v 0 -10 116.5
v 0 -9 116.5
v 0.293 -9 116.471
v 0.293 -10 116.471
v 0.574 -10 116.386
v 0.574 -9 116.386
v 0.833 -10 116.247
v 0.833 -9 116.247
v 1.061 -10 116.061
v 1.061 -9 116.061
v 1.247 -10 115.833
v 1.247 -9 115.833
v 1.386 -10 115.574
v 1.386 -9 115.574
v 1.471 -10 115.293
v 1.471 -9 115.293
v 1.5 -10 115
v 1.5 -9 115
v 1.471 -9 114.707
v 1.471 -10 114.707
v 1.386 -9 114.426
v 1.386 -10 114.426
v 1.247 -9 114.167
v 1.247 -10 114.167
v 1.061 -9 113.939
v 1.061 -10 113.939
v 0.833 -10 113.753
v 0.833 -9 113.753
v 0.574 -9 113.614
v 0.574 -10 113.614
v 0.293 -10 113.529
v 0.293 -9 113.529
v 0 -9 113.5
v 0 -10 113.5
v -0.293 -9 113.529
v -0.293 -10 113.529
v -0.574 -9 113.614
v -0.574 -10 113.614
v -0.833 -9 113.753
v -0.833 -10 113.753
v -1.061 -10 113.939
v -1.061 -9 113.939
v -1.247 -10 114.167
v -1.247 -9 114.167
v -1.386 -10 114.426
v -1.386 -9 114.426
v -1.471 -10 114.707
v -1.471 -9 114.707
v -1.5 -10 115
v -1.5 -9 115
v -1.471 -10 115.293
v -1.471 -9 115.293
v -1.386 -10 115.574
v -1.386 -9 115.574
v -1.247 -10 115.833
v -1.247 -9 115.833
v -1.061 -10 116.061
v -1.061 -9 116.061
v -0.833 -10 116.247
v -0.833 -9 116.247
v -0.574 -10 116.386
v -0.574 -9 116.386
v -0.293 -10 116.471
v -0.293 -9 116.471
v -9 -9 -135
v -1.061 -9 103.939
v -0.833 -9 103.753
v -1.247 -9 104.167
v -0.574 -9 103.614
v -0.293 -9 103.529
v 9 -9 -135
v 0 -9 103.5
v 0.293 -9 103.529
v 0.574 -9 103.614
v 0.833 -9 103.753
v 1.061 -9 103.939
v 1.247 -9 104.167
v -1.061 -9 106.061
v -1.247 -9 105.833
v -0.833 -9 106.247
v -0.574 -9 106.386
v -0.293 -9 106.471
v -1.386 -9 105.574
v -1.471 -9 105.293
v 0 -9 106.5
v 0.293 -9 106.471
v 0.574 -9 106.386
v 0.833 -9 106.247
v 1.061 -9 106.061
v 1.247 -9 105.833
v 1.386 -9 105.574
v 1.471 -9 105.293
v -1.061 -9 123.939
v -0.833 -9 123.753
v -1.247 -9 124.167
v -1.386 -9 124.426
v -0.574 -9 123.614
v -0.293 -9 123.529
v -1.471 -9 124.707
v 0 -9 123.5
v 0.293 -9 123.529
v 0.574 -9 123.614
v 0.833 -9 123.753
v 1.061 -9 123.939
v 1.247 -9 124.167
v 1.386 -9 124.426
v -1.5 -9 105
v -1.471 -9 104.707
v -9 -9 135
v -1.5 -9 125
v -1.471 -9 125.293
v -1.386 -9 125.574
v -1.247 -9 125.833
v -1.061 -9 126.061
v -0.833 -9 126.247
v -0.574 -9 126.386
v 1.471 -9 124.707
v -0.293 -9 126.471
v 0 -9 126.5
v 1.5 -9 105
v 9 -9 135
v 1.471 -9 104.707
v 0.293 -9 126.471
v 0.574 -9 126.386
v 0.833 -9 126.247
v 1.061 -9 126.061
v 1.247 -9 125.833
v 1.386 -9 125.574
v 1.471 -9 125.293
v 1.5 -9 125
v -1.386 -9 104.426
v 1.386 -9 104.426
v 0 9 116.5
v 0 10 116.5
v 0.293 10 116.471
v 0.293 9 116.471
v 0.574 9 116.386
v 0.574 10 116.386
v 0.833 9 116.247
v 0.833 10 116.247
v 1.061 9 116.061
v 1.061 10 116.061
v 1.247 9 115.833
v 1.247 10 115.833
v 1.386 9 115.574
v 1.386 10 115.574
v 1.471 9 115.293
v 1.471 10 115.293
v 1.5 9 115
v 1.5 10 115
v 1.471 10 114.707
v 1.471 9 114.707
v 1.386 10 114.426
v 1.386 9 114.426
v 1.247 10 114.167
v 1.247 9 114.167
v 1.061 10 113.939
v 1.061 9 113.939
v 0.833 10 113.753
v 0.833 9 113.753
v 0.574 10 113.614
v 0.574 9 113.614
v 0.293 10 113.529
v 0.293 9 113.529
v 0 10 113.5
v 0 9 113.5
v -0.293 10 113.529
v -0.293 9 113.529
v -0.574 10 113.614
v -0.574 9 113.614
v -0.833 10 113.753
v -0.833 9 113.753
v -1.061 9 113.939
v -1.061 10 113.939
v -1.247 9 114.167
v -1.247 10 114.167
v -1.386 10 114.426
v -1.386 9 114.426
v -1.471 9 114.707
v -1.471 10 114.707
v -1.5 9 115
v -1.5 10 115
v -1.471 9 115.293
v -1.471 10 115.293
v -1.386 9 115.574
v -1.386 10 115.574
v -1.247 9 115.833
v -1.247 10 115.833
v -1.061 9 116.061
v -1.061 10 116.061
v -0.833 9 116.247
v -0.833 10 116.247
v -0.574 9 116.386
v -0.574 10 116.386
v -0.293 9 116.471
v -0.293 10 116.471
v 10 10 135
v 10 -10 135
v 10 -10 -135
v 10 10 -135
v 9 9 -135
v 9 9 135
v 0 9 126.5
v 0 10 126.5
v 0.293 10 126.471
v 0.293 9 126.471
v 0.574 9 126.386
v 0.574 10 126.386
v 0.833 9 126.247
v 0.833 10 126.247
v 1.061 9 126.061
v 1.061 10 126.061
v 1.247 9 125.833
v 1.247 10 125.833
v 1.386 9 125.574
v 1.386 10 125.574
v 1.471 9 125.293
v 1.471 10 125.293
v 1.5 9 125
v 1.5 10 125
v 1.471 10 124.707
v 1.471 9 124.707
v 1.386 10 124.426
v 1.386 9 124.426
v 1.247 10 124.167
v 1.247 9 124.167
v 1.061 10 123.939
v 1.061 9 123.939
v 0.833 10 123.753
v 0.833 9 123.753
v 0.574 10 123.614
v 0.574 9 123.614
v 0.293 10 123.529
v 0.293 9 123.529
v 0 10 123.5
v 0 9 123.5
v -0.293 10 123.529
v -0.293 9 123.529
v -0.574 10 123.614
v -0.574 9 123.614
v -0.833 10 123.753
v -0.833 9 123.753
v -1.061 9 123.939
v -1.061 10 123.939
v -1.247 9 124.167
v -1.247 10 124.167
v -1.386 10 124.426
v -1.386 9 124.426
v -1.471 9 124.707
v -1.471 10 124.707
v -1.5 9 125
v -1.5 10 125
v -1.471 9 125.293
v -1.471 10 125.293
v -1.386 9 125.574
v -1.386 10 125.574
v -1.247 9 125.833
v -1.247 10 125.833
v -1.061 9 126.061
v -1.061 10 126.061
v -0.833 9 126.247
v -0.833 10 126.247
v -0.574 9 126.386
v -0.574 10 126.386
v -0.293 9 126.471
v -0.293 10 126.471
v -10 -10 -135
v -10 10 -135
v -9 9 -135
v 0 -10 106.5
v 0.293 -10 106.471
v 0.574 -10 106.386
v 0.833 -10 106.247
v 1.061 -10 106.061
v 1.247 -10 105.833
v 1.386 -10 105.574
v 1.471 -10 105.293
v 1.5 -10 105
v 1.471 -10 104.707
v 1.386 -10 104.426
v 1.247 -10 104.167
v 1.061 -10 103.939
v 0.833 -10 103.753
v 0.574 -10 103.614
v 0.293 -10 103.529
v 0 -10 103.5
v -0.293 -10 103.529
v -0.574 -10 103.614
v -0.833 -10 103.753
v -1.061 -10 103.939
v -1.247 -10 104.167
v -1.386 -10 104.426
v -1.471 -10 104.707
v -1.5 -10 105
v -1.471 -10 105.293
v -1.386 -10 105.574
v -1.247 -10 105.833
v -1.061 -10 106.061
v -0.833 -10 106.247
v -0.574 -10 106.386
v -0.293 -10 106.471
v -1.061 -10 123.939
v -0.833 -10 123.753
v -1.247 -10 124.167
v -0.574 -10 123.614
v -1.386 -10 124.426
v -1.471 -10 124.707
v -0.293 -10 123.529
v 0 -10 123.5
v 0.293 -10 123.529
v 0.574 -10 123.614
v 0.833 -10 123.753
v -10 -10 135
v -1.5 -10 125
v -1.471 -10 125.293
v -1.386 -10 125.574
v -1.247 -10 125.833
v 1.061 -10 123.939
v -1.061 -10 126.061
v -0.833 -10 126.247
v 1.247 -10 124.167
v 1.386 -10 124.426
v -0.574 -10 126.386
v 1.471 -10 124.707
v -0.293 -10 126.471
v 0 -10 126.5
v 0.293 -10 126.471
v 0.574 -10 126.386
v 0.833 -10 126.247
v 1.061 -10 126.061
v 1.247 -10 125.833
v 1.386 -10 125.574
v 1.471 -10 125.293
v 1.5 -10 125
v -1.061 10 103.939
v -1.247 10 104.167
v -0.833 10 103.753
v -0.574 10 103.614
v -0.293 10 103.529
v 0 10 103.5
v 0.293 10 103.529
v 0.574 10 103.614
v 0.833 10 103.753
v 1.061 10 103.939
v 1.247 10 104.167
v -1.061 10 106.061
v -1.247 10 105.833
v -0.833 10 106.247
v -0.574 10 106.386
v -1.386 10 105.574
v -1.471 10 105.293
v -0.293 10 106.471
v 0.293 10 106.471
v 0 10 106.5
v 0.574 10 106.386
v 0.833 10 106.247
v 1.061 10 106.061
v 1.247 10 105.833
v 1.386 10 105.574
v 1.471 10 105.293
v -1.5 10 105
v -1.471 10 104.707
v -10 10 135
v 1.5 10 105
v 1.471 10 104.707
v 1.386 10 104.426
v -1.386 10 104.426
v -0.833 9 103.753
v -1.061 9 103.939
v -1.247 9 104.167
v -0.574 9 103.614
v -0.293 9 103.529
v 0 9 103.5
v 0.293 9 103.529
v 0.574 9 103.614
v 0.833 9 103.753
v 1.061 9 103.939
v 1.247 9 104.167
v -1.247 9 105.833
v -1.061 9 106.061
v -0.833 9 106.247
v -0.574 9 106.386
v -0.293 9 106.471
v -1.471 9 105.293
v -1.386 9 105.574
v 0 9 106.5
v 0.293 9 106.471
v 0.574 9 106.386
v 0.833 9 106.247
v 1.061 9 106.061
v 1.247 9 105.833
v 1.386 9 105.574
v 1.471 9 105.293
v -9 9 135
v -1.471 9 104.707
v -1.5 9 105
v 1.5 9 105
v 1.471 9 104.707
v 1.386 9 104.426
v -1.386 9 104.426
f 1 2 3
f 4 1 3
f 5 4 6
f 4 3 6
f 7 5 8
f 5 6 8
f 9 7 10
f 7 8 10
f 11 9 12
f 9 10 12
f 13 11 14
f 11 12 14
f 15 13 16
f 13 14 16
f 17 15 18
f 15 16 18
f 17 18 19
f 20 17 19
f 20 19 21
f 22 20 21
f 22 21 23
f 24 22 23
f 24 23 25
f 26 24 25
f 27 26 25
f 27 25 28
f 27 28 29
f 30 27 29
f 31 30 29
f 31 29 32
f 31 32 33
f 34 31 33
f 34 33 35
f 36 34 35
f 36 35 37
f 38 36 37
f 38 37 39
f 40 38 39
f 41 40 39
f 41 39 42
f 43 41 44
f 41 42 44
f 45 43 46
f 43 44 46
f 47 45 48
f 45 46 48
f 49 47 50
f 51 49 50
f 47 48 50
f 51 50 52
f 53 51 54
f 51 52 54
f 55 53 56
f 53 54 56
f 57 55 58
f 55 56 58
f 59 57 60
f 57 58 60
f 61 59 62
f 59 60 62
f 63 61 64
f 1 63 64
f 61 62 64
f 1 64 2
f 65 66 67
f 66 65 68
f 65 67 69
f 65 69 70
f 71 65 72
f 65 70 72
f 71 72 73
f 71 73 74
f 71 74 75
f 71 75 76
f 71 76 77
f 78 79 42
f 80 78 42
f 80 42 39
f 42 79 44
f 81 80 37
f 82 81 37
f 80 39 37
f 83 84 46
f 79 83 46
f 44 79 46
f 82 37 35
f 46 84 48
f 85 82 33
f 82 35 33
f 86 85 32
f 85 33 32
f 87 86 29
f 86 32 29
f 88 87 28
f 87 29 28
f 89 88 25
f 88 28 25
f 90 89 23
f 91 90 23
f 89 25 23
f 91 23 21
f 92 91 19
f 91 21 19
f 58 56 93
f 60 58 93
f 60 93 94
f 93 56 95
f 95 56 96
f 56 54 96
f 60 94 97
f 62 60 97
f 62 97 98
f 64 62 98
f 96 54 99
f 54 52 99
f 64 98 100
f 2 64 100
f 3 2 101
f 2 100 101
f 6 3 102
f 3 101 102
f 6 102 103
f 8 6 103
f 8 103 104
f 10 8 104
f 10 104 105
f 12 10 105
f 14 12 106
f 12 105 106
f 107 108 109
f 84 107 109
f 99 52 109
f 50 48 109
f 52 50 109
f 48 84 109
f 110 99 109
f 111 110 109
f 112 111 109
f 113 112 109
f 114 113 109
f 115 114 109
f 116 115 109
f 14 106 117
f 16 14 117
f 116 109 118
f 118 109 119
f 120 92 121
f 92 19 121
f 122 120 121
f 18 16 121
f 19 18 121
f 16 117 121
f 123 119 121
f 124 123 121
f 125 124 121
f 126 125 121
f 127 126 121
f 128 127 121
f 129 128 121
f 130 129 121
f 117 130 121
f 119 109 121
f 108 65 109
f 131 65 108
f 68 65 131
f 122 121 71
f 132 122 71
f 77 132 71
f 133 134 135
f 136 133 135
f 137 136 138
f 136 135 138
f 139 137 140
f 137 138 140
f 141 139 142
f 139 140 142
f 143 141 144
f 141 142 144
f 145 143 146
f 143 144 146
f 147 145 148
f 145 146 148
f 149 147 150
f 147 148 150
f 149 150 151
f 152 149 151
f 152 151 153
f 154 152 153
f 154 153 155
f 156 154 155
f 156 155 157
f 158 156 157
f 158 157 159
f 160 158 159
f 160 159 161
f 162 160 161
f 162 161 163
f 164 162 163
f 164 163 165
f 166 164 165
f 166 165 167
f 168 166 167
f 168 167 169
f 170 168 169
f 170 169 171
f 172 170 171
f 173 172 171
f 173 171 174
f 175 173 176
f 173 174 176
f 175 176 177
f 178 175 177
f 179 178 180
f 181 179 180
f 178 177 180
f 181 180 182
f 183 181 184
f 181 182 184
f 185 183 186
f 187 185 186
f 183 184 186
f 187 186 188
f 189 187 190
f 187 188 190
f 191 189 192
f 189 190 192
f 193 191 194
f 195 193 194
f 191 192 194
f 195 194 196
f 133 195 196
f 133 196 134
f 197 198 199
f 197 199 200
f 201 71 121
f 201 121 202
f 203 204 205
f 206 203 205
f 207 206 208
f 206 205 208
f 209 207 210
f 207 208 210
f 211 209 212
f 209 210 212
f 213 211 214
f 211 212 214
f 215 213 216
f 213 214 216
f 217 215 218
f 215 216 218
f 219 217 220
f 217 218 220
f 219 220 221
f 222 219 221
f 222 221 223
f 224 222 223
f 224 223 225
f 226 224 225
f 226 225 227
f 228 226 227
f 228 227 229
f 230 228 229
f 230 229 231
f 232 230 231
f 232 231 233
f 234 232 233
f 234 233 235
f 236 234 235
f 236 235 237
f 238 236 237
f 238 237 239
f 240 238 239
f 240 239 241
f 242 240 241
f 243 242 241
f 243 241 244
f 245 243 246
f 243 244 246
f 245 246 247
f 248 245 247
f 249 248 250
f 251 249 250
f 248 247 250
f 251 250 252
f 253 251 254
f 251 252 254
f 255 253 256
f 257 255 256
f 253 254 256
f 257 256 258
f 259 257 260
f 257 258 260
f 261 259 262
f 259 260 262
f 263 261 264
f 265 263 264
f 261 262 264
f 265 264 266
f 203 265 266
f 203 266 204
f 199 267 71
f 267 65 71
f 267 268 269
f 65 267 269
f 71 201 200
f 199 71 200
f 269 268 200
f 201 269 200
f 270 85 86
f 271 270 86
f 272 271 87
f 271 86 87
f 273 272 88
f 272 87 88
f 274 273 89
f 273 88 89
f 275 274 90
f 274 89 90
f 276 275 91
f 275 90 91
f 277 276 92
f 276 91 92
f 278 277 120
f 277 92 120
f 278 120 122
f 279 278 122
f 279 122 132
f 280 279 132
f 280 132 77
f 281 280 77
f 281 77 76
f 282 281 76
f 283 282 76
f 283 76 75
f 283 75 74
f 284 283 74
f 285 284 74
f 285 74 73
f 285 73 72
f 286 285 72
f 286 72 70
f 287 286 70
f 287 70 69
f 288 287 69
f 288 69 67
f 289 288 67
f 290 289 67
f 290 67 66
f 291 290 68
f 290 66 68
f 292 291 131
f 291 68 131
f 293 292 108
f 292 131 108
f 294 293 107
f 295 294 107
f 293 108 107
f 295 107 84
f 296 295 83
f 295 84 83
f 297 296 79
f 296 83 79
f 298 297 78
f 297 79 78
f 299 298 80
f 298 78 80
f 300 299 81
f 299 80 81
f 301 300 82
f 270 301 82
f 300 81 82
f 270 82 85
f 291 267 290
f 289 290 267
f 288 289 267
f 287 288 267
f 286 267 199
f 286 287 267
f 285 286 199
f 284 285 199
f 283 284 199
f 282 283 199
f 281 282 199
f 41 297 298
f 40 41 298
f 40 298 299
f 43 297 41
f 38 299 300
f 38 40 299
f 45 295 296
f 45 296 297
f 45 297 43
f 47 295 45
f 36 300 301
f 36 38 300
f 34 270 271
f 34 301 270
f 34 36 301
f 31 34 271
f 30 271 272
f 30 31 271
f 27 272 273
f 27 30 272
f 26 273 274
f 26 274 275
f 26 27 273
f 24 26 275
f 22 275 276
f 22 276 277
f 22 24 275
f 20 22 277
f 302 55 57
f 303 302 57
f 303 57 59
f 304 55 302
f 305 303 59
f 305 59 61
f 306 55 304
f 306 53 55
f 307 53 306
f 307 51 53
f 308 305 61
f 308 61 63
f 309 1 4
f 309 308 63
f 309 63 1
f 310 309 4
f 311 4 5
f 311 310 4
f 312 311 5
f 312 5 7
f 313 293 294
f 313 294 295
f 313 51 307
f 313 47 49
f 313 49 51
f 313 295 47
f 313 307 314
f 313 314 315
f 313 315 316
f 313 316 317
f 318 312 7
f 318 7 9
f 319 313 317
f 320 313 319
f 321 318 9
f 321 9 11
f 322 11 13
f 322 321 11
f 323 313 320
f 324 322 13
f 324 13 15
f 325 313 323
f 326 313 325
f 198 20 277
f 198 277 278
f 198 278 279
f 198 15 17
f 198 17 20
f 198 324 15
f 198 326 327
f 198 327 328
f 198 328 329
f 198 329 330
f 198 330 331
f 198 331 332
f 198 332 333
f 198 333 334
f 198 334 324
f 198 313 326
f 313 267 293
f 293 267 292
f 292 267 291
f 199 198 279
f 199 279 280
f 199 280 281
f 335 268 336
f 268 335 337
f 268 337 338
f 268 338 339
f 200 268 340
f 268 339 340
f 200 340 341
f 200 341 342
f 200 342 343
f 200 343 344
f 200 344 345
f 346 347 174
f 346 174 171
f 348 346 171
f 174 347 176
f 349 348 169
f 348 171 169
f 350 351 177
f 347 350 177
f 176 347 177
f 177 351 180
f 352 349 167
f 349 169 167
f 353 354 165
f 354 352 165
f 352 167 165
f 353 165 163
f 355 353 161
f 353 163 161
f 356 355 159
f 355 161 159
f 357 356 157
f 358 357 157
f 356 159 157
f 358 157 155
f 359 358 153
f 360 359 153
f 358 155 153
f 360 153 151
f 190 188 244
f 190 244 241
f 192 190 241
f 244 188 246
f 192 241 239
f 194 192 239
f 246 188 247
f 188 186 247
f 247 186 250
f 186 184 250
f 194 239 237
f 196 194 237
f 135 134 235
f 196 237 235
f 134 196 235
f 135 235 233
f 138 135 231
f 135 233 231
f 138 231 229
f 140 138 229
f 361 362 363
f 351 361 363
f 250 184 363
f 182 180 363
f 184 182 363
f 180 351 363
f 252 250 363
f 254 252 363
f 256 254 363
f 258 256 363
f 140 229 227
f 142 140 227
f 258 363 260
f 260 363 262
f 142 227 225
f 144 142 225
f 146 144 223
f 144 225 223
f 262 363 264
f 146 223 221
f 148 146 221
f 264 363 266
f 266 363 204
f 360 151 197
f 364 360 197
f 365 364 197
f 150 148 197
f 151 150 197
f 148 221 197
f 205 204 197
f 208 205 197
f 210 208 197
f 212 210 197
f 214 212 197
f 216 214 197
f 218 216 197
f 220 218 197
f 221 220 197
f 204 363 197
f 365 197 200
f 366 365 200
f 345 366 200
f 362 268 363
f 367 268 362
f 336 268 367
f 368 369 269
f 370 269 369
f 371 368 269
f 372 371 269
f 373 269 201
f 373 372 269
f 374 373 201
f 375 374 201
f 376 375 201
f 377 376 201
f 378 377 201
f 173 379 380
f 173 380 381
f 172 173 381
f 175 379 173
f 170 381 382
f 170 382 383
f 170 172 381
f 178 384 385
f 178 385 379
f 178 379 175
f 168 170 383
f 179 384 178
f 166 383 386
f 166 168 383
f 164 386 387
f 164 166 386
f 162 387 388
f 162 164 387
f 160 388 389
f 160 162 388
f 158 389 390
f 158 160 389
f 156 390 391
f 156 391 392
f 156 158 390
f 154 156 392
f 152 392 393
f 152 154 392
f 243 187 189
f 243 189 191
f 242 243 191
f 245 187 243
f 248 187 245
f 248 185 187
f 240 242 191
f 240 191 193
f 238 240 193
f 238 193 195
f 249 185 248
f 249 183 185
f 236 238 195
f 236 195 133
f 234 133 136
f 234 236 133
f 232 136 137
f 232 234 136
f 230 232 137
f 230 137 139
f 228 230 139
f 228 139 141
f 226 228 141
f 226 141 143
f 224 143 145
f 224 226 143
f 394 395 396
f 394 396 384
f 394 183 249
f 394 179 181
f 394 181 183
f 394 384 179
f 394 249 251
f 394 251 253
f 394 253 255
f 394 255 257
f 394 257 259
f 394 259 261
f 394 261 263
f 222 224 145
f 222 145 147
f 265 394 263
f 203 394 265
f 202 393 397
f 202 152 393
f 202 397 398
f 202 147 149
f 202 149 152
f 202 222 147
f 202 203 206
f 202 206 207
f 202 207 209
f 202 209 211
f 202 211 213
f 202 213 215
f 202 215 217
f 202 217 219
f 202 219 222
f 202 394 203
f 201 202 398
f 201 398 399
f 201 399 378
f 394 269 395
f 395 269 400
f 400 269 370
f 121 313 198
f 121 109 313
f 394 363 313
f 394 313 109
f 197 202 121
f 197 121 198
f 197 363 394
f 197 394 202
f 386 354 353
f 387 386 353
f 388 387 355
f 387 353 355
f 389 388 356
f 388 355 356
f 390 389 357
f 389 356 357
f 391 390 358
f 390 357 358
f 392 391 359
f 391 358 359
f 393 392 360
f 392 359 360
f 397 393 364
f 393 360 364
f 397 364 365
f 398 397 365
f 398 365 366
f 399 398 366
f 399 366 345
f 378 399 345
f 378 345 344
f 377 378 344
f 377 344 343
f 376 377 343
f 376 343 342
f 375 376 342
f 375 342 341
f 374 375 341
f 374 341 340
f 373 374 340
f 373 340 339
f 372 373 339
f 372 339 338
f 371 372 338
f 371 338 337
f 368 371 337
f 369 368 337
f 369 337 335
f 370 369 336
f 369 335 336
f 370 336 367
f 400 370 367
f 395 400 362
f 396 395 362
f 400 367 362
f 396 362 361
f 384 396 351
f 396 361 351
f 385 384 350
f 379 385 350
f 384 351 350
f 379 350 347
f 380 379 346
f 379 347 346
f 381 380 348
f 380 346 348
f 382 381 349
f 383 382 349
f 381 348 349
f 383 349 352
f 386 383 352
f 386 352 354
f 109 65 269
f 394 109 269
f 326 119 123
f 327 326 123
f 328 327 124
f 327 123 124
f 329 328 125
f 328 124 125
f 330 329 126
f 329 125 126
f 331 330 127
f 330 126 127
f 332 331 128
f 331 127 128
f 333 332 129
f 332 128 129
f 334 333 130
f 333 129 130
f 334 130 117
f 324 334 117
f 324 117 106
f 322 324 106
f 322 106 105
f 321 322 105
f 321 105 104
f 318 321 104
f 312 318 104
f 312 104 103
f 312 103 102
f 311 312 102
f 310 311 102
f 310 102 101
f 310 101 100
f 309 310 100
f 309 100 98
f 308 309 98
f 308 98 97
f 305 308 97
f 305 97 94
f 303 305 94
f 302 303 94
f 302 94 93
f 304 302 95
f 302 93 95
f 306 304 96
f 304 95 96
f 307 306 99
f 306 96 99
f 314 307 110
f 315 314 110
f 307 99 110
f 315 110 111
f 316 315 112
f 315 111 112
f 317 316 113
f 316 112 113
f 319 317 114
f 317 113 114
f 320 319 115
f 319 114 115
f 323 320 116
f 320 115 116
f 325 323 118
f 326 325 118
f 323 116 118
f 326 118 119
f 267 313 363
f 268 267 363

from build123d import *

# Parameters (mm, degrees)
SKETCH_1_W          = 20
SKETCH_1_H          = 20
SKETCH_1_W_2        = 18
SKETCH_1_H_2        = 18
EXTRUDE_1_DEPTH     = 135
SKETCH_2_R          = 1.5
CUT_EXTRUDE_1_DEPTH = 100


with BuildPart() as part:
    # 草图1 → 凸台-拉伸1 (new, symmetric)
    with BuildSketch(Plane.XY):
        Rectangle(SKETCH_1_W, SKETCH_1_H)
        Rectangle(SKETCH_1_W_2, SKETCH_1_H_2, mode=Mode.SUBTRACT)
    extrude(amount=EXTRUDE_1_DEPTH, both=True)

    # 草图2 → 切除-拉伸1 (cut)
    with BuildSketch(Plane(origin=(0, 10, 0), x_dir=(1, 0, 0), z_dir=(0, 1, 0))):
        with Locations(Location((0, -125, 0), (0, 0, 270))):
            Circle(SKETCH_2_R)
        with Locations(Location((0, -115, 0), (0, 0, 270))):
            Circle(SKETCH_2_R)
        with Locations(Location((0, -105, 0), (0, 0, 270))):
            Circle(SKETCH_2_R)
    extrude(amount=-CUT_EXTRUDE_1_DEPTH, mode=Mode.SUBTRACT)


solid = part.part
